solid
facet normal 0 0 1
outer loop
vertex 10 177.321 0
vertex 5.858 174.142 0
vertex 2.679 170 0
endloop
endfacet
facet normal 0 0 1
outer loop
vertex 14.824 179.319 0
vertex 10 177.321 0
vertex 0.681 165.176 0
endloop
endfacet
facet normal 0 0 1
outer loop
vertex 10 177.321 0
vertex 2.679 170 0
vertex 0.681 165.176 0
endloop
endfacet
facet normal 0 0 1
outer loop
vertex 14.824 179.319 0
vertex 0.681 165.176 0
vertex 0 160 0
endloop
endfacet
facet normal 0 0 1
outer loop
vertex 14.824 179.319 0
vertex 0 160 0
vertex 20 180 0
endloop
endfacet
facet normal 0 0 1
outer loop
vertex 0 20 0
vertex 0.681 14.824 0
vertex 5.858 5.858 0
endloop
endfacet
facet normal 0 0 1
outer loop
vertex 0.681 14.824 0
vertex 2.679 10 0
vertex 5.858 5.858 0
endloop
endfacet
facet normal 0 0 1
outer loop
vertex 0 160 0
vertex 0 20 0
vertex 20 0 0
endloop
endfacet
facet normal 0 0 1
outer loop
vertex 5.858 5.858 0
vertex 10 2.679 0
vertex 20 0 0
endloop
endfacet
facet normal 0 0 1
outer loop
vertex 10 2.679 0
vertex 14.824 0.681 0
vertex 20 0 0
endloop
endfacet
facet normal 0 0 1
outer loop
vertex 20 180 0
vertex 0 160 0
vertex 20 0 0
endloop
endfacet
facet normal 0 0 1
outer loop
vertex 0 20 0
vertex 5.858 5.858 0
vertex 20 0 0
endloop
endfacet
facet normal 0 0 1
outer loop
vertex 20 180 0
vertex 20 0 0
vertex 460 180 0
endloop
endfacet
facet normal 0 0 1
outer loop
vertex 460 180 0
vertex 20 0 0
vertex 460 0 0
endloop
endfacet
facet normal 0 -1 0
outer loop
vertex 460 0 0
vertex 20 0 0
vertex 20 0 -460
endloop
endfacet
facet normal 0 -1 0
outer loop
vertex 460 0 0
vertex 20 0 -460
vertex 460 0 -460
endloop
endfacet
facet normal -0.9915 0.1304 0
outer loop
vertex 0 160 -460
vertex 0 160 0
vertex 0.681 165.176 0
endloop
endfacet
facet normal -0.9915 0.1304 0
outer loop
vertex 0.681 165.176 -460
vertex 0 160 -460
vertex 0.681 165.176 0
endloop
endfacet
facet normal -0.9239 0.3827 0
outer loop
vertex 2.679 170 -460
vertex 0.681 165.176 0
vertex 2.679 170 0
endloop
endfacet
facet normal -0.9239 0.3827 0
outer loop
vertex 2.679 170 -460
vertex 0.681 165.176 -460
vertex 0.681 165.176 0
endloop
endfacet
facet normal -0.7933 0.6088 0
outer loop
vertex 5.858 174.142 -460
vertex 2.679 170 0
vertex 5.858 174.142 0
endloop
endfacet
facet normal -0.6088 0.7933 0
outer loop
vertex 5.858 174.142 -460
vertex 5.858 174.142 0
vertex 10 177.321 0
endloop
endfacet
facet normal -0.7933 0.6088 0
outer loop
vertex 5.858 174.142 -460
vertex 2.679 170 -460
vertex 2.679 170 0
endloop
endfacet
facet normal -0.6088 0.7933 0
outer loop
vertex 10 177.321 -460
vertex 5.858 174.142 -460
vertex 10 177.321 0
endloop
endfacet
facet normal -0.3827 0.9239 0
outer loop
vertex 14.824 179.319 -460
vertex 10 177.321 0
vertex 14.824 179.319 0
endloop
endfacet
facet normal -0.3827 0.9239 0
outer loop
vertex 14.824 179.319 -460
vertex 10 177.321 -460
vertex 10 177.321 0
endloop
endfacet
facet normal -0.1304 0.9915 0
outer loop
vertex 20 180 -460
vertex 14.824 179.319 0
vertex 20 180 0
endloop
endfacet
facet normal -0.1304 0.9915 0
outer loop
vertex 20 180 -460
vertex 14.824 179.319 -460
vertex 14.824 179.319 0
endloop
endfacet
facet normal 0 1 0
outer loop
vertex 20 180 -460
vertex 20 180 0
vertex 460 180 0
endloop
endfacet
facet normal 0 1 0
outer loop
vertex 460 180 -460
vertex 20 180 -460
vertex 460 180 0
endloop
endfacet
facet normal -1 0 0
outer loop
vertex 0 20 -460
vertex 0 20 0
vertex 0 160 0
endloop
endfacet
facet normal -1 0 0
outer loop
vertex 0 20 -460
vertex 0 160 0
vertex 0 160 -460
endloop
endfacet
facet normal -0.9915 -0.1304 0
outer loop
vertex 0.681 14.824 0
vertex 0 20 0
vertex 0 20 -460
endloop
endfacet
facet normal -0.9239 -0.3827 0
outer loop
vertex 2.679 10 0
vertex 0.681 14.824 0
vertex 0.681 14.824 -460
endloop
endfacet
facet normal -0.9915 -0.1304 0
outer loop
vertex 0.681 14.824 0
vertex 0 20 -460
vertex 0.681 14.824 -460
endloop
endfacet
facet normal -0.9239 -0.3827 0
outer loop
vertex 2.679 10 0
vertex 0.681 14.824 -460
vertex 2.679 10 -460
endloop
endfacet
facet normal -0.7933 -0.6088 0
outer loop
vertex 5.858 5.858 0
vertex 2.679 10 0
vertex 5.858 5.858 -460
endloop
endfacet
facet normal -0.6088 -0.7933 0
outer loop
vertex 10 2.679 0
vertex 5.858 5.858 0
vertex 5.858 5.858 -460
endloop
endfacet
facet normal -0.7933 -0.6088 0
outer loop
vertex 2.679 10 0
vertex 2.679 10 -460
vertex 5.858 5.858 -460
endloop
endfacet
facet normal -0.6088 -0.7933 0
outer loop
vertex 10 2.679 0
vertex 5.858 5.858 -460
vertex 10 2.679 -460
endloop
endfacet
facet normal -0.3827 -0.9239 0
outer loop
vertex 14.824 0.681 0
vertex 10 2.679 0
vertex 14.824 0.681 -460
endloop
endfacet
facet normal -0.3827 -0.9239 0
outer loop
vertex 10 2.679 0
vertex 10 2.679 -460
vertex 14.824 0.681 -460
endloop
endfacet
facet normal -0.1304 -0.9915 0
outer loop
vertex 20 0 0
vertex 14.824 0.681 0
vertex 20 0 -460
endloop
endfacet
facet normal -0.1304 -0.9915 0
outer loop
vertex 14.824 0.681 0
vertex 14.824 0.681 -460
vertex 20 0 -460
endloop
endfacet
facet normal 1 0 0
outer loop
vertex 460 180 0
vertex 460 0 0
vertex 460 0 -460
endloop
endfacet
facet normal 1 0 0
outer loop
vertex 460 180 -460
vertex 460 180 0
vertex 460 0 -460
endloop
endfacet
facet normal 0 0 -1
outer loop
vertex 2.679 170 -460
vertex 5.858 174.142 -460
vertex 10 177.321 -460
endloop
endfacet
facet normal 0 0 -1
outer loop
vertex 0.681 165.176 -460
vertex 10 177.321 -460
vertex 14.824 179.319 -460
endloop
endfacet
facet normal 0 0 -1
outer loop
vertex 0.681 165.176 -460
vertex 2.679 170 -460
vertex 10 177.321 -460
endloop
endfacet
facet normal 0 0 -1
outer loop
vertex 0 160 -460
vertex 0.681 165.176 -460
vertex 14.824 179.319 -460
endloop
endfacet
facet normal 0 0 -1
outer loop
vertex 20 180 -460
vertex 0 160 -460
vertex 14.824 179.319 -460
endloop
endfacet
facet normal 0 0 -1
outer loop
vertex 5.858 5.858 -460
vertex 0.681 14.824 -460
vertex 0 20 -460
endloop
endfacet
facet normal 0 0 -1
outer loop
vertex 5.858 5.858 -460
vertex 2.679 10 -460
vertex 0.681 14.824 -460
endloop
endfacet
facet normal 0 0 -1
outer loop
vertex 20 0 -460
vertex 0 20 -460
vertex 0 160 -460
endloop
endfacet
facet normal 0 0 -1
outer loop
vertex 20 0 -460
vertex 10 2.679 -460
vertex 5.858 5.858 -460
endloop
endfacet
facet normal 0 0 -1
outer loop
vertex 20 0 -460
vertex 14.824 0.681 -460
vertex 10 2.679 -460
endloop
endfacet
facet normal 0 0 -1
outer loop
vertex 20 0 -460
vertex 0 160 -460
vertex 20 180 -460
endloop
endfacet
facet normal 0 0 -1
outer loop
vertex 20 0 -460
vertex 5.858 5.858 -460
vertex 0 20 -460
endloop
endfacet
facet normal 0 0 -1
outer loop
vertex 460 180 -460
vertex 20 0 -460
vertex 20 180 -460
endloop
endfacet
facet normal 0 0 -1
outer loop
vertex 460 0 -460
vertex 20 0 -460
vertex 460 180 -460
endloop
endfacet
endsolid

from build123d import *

# Parameters (mm, degrees)
SKETCH1_W           = 460
SKETCH1_H           = 460
BOSS_EXTRUDE1_DEPTH = 180
FILLET1_R           = 20


with BuildPart() as part:
    # Sketch1 → Boss-Extrude1 (new body)
    with BuildSketch(Plane(origin=(0, 0, 0), x_dir=(1, 0, 0), z_dir=(0, 1, 0))):
        with Locations((230, 230)):
            Rectangle(SKETCH1_W, SKETCH1_H)
    extrude(amount=BOSS_EXTRUDE1_DEPTH)

    # Fillet1
    fillet1_edges = [part.edges().sort_by_distance(p)[0] for p in [
        (0, 180, -230),
        (0, 0, -230),
    ]]
    fillet(fillet1_edges, radius=FILLET1_R)


solid = part.part
